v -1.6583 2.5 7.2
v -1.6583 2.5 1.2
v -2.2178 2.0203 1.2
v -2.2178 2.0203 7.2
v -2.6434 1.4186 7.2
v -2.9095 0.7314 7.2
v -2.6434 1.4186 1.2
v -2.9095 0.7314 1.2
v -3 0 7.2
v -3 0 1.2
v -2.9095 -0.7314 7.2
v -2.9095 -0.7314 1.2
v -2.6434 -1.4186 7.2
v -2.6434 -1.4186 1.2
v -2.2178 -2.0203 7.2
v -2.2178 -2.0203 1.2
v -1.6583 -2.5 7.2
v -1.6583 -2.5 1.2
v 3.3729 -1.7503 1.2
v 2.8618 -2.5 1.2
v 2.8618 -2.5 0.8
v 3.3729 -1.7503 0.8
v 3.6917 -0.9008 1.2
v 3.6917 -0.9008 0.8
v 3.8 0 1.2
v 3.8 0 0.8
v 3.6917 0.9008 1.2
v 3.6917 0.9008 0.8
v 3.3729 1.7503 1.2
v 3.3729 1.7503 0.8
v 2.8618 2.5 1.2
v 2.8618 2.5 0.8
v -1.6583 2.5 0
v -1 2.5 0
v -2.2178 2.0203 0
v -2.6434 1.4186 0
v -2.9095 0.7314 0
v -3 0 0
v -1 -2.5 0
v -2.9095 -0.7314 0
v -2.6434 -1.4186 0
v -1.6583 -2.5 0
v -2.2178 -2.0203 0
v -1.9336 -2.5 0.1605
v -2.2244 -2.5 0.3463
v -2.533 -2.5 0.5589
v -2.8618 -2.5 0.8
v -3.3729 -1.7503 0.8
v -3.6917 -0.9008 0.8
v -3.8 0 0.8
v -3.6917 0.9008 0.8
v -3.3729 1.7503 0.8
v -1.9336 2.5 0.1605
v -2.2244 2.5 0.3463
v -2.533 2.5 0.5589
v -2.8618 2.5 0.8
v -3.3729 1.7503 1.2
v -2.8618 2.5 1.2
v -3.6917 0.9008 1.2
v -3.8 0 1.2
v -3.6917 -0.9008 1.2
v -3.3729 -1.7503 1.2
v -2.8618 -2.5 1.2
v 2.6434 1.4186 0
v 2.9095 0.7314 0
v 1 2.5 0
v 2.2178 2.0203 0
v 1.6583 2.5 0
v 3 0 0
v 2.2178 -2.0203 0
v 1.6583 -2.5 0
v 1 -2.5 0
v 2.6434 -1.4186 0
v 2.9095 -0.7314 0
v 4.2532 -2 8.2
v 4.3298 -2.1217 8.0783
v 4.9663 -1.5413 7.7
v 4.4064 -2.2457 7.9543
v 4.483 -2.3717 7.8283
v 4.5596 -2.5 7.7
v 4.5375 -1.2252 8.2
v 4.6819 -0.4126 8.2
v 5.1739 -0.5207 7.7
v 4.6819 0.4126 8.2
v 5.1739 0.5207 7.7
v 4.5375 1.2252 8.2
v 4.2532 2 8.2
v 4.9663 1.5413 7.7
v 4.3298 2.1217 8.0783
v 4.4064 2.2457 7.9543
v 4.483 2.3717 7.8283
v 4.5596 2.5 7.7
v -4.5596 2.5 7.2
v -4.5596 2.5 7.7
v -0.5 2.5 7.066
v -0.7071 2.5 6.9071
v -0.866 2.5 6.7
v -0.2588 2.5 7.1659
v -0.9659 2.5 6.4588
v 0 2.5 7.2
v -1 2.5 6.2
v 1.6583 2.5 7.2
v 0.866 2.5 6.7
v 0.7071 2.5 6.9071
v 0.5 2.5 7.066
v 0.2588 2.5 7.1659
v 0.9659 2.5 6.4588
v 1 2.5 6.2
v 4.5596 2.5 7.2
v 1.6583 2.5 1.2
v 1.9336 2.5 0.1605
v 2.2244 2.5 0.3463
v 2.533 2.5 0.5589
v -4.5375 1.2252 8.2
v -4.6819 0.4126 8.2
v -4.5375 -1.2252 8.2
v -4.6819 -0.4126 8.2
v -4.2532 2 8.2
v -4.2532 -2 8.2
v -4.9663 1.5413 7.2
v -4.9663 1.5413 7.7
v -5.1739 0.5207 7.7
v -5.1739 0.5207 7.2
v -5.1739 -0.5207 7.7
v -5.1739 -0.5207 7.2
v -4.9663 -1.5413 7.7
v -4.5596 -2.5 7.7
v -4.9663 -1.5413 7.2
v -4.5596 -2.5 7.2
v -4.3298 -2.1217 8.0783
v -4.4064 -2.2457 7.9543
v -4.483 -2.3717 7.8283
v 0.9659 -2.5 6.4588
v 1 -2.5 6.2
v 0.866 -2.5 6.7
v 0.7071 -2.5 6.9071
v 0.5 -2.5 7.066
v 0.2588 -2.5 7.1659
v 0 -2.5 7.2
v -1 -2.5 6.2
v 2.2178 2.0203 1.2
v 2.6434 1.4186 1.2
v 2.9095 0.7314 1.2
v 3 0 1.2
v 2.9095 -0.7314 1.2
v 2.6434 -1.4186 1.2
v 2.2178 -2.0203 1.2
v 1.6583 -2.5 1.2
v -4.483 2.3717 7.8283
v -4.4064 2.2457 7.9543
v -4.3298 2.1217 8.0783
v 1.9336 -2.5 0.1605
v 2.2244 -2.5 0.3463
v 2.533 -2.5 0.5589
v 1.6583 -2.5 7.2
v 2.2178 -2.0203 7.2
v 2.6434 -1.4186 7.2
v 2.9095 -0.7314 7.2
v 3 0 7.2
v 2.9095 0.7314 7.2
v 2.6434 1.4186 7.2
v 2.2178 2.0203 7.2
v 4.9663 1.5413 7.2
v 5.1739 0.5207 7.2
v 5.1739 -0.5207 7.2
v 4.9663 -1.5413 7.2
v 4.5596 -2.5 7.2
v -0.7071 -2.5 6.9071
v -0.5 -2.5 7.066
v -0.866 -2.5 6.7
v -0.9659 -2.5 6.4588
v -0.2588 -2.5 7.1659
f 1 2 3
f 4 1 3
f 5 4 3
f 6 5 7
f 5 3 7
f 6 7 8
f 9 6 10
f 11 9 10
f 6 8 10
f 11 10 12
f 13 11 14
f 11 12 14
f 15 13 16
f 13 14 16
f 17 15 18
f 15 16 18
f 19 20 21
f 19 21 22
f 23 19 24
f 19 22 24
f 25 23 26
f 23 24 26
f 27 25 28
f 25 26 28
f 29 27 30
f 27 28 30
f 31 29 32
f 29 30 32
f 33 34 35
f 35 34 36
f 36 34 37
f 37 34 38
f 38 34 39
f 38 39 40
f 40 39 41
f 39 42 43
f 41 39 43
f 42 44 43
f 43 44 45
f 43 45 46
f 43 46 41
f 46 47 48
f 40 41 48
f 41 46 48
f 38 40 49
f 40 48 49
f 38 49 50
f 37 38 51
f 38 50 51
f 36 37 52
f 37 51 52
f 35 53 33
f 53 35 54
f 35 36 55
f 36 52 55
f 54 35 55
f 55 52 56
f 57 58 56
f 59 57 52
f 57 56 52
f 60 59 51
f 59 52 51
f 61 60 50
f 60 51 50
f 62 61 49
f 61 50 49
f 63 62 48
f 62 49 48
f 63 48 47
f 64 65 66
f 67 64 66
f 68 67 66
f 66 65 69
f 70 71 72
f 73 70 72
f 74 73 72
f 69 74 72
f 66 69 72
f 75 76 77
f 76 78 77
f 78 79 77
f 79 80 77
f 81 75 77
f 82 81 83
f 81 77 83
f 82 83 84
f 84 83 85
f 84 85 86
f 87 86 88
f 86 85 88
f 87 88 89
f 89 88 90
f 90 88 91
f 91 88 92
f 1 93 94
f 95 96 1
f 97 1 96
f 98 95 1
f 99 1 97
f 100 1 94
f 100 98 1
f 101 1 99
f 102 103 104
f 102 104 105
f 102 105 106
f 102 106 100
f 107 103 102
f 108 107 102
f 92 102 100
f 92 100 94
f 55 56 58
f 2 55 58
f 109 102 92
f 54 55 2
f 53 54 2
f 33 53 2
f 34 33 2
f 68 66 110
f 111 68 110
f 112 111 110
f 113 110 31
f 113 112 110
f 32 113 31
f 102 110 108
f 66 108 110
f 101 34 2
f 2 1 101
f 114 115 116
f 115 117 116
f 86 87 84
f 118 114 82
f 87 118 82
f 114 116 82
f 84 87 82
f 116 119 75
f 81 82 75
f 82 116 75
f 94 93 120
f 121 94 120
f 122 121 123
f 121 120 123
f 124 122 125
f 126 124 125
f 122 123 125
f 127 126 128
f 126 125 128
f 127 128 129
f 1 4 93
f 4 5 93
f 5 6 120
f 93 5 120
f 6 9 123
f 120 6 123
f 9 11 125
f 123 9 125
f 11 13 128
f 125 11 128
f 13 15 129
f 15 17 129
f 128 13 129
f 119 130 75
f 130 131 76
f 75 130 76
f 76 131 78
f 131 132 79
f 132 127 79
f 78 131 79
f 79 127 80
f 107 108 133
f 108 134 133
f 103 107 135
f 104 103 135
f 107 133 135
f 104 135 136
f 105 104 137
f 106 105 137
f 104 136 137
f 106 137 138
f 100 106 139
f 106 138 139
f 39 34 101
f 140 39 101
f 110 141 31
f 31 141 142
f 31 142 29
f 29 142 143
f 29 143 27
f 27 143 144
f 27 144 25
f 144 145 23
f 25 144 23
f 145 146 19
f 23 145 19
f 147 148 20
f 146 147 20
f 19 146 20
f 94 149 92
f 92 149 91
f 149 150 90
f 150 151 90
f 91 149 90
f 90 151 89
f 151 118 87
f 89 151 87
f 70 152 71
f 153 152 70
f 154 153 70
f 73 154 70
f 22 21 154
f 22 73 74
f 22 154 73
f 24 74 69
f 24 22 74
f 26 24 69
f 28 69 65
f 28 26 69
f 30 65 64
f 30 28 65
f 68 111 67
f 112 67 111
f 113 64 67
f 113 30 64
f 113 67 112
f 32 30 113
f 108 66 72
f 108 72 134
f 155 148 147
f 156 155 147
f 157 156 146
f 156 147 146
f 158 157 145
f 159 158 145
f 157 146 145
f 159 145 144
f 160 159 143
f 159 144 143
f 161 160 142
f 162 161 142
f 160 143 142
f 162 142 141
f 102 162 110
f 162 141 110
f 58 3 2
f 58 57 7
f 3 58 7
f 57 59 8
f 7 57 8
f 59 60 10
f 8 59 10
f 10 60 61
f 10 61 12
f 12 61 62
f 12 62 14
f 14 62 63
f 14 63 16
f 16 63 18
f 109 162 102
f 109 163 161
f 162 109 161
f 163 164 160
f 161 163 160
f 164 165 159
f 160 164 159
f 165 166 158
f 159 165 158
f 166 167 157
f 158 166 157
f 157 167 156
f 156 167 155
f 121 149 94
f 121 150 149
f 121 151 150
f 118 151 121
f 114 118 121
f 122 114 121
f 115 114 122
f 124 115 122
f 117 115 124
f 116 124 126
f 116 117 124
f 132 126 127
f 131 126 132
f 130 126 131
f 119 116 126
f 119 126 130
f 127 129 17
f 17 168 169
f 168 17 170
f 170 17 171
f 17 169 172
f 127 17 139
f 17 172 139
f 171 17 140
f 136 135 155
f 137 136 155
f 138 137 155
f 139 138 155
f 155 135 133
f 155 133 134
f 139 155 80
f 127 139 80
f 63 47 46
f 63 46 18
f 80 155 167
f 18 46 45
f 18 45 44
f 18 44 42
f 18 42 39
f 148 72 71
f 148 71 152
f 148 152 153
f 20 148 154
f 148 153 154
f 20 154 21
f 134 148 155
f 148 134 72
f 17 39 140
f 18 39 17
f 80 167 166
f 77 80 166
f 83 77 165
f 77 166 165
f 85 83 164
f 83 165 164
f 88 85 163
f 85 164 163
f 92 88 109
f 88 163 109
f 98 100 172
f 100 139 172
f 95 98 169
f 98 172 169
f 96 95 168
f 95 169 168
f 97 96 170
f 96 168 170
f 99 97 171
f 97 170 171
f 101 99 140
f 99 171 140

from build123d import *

# Parameters (mm, degrees)
F2_W          = 32.7764776534
F2_H          = 9.1045777517
F2_W_2        = 20.9091340361
F2_H_2        = 3.5162510286
F3_DEPTH      = 25
F4_W          = 2
F4_H          = 7.2
F5_DEPTH      = 25
F5_DEPTH_BACK = 25
F6_R          = 0.99999
F7_SIZE       = 0.8
F8_SIZE       = 0.5


# Not quite as in the source:
# - a fillet or chamfer is up to 0.001 mm smaller than in the source, because OpenCascade refuses the exact size


with BuildPart() as f1:
    # F0 (on Front) → F1 (revolve)
    with BuildSketch(Plane.XZ):
        Polygon((0, 0), (0, 8.2), (-5.2, 8.2), (-5.2, 7.2), (-3, 7.2), (-3, 1.2), (-3.8, 1.2), (-3.8, 0), align=None)
    revolve(axis=Axis((0, 0, 4.1), (0, 0, 1)))

    # F2 (on Top) → F3 (cut)
    with BuildSketch(Plane.XY):
        with Locations((1.9882628694, 7.0522888758)):
            Rectangle(F2_W, F2_H)
        with Locations((1.9568684145, -4.2581255143)):
            Rectangle(F2_W_2, F2_H_2)
    extrude(amount=F3_DEPTH, mode=Mode.SUBTRACT)

    # F4 (on Front) → F5 (cut, two sides)
    with BuildSketch(Plane.XZ) as f5_sk:
        with Locations((0, 3.6)):
            Rectangle(F4_W, F4_H)
    extrude(amount=-F5_DEPTH, mode=Mode.SUBTRACT)
    extrude(f5_sk.sketch, amount=F5_DEPTH_BACK, mode=Mode.SUBTRACT)

    # F6 (radius 1 in the source; OpenCascade refuses exactly that, so slightly less here)
    f6_edges = [f1.edges().sort_by_distance(p)[0] for p in [
        (-1, 0, 7.2),
        (1, 0, 7.2),
    ]]
    fillet(f6_edges, radius=F6_R)

    # F7
    f7_edges = [f1.edges().sort_by_distance(p)[0] for p in [
        (3.8, 0, 0),
        (-3.8, 0, 0),
    ]]
    chamfer(f7_edges, length=F7_SIZE)

    # F8
    f8_edges = [f1.edges().sort_by_distance(p)[0] for p in [
        (0, -2.5, 8.2),
        (-5.2, 0, 8.2),
        (0, 2.5, 8.2),
        (5.2, 0, 8.2),
    ]]
    chamfer(f8_edges, length=F8_SIZE)


solid = f1.part
